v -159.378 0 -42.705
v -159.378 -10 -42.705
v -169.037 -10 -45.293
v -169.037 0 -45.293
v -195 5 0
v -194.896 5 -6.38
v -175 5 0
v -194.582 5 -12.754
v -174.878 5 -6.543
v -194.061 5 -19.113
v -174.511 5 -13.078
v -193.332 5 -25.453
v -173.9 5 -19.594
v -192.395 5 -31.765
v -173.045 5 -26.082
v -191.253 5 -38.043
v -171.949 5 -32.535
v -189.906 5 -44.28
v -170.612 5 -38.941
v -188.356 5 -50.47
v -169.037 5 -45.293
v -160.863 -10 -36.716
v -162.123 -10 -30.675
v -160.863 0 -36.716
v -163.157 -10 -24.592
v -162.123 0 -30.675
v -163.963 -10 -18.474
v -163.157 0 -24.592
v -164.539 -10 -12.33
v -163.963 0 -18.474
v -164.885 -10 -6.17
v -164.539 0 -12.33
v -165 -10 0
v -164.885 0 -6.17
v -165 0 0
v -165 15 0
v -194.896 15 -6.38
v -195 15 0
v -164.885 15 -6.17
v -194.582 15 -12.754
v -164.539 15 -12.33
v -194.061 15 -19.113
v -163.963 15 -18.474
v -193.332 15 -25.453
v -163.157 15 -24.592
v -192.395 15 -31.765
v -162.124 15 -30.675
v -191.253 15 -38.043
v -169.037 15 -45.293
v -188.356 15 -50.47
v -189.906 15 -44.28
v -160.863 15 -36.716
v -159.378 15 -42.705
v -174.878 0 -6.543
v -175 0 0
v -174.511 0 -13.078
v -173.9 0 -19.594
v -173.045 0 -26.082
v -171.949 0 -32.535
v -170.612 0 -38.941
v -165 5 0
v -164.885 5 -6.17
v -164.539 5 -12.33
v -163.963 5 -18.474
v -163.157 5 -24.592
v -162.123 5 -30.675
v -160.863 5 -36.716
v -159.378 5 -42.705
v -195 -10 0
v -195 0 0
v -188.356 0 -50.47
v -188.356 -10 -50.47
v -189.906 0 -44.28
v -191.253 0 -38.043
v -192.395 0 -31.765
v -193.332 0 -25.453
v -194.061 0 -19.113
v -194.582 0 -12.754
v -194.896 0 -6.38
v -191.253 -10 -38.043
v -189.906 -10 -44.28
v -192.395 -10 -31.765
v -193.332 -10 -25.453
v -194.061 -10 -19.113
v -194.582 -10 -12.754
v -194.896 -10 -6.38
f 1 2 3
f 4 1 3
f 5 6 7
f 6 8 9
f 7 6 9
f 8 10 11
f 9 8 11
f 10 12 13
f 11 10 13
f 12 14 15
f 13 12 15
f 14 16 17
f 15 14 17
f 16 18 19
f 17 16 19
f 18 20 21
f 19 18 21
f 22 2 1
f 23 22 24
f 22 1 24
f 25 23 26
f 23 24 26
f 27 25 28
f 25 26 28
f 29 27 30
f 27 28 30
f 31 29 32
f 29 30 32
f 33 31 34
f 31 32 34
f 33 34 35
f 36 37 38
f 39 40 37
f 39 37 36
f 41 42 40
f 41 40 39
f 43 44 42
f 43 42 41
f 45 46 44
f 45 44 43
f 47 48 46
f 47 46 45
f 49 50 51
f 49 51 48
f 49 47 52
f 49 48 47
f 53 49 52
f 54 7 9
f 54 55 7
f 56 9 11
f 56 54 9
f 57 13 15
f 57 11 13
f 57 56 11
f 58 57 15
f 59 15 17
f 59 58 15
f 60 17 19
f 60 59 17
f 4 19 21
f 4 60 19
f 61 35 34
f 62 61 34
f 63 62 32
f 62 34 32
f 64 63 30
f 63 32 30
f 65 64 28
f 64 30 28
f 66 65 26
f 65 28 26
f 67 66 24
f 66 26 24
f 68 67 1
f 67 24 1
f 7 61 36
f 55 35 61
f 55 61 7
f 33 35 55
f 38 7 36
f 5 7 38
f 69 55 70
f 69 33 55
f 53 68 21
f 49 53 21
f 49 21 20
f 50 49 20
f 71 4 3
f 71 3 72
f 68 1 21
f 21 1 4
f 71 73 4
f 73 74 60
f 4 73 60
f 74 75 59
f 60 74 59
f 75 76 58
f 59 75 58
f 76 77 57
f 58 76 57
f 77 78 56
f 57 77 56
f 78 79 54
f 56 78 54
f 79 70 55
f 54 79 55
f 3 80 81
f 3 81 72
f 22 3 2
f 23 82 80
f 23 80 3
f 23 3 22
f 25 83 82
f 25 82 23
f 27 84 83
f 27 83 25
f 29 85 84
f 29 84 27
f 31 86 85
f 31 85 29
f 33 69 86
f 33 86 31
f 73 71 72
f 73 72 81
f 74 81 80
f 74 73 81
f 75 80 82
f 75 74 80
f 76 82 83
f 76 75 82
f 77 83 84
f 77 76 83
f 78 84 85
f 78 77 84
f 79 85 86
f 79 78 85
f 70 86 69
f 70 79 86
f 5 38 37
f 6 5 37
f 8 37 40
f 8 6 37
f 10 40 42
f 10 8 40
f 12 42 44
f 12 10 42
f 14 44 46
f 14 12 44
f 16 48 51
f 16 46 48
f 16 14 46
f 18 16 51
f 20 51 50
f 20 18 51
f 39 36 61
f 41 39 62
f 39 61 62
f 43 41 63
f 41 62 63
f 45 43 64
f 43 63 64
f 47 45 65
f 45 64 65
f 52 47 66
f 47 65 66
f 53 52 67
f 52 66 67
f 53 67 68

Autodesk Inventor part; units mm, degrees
ref_plane "YZ Plane" through (0, 0, 0) normal (1, 0, 0) x (0, 1, 0)
ref_plane "XZ Plane" through (0, 0, 0) normal (0, 1, 0) x (-1, 0, 0)
ref_plane "XY Plane" through (0, 0, 0) normal (0, 0, 1) x (1, 0, 0)
sketch "Sketch1" plane through (0, 0, 0) normal (0, 1, 0) x (-1, 0, 0)
  circle A0 centre (0, 0) radius 165
  circle A1 centre (0, 0) radius 175
  line L0 (0, 0) -> (175, 0)
  line L1 (0, 0) -> (169.037, -45.2933)
  point P0 (159.3778, -42.7051)
  point P1 (165, 0)
  dimension "d0" = 10
  dimension "d1" = 330
  dimension "d2" = 15
extrude "Extrusion1" add sketch "Sketch1" along normal blind 5 contours L0 A1 L1 A0 picked at (171.4447, -5.0841)
sketch "Sketch3" plane through (0, 5, 0) normal (0, 1, 0) x (1, 0, 0)
  arc A0 (-169.037, 45.2933) -> (-175, 0) centre (0, 0) ccw projected
  line L0 (-175, 0) -> (-165, 0) projected
  arc A1 (-159.3778, 42.7051) -> (-165, 0) centre (0, 0) ccw projected
  line L1 (-159.3778, 42.7051) -> (-169.037, 45.2933) projected
  circle A2 centre (0, 0) radius 175
  circle A3 centre (0, 0) radius 165
  circle A4 centre (0, 0) radius 195
  line L2 (0, 0) -> (-188.3555, 50.4697)
  line L3 (0, 0) -> (-195, 0)
  point P0 (-175, 0)
  dimension "d10" = 20
extrude "Extrusion2" add sketch "Sketch3" along normal blind 10 contours L1 A1 L0 A0 | A0 L3 A4 L2
sketch "Sketch4" plane through (0, 0, 0) normal (0, -1, 0) x (1, 0, 0)
  arc A0 (-195, 0) -> (-188.3555, -50.4697) centre (0, 0) ccw projected
  arc A1 (-175, 0) -> (-169.037, -45.2933) centre (0, 0) ccw projected
  line L0 (-159.3778, -42.7051) -> (-169.037, -45.2933) projected
  arc A2 (-165, 0) -> (-159.3778, -42.7051) centre (0, 0) ccw projected
  line L1 (-175, 0) -> (-165, 0) projected
  circle A3 centre (0, 0) radius 175
  circle A4 centre (0, 0) radius 195
  line L2 (0, 0) -> (-175, 0)
  line L3 (0, 0) -> (-169.037, -45.2933)
  arc A5 (-175, 0) -> (-169.037, -45.2933) centre (0, 0) ccw projected
  line L4 (-195, 0) -> (-175, 0) projected
  line L5 (-169.037, -45.2933) -> (-188.3555, -50.4697) projected
  point P0 (-169.037, -45.2933)
extrude "Extrusion3" add sketch "Sketch4" along normal blind 10 contours L4 A1 L5 A0 | L1 A2 L0 A1
properties part number "Moving Carousel Base Inner Clip" material "PLA Plastic"
